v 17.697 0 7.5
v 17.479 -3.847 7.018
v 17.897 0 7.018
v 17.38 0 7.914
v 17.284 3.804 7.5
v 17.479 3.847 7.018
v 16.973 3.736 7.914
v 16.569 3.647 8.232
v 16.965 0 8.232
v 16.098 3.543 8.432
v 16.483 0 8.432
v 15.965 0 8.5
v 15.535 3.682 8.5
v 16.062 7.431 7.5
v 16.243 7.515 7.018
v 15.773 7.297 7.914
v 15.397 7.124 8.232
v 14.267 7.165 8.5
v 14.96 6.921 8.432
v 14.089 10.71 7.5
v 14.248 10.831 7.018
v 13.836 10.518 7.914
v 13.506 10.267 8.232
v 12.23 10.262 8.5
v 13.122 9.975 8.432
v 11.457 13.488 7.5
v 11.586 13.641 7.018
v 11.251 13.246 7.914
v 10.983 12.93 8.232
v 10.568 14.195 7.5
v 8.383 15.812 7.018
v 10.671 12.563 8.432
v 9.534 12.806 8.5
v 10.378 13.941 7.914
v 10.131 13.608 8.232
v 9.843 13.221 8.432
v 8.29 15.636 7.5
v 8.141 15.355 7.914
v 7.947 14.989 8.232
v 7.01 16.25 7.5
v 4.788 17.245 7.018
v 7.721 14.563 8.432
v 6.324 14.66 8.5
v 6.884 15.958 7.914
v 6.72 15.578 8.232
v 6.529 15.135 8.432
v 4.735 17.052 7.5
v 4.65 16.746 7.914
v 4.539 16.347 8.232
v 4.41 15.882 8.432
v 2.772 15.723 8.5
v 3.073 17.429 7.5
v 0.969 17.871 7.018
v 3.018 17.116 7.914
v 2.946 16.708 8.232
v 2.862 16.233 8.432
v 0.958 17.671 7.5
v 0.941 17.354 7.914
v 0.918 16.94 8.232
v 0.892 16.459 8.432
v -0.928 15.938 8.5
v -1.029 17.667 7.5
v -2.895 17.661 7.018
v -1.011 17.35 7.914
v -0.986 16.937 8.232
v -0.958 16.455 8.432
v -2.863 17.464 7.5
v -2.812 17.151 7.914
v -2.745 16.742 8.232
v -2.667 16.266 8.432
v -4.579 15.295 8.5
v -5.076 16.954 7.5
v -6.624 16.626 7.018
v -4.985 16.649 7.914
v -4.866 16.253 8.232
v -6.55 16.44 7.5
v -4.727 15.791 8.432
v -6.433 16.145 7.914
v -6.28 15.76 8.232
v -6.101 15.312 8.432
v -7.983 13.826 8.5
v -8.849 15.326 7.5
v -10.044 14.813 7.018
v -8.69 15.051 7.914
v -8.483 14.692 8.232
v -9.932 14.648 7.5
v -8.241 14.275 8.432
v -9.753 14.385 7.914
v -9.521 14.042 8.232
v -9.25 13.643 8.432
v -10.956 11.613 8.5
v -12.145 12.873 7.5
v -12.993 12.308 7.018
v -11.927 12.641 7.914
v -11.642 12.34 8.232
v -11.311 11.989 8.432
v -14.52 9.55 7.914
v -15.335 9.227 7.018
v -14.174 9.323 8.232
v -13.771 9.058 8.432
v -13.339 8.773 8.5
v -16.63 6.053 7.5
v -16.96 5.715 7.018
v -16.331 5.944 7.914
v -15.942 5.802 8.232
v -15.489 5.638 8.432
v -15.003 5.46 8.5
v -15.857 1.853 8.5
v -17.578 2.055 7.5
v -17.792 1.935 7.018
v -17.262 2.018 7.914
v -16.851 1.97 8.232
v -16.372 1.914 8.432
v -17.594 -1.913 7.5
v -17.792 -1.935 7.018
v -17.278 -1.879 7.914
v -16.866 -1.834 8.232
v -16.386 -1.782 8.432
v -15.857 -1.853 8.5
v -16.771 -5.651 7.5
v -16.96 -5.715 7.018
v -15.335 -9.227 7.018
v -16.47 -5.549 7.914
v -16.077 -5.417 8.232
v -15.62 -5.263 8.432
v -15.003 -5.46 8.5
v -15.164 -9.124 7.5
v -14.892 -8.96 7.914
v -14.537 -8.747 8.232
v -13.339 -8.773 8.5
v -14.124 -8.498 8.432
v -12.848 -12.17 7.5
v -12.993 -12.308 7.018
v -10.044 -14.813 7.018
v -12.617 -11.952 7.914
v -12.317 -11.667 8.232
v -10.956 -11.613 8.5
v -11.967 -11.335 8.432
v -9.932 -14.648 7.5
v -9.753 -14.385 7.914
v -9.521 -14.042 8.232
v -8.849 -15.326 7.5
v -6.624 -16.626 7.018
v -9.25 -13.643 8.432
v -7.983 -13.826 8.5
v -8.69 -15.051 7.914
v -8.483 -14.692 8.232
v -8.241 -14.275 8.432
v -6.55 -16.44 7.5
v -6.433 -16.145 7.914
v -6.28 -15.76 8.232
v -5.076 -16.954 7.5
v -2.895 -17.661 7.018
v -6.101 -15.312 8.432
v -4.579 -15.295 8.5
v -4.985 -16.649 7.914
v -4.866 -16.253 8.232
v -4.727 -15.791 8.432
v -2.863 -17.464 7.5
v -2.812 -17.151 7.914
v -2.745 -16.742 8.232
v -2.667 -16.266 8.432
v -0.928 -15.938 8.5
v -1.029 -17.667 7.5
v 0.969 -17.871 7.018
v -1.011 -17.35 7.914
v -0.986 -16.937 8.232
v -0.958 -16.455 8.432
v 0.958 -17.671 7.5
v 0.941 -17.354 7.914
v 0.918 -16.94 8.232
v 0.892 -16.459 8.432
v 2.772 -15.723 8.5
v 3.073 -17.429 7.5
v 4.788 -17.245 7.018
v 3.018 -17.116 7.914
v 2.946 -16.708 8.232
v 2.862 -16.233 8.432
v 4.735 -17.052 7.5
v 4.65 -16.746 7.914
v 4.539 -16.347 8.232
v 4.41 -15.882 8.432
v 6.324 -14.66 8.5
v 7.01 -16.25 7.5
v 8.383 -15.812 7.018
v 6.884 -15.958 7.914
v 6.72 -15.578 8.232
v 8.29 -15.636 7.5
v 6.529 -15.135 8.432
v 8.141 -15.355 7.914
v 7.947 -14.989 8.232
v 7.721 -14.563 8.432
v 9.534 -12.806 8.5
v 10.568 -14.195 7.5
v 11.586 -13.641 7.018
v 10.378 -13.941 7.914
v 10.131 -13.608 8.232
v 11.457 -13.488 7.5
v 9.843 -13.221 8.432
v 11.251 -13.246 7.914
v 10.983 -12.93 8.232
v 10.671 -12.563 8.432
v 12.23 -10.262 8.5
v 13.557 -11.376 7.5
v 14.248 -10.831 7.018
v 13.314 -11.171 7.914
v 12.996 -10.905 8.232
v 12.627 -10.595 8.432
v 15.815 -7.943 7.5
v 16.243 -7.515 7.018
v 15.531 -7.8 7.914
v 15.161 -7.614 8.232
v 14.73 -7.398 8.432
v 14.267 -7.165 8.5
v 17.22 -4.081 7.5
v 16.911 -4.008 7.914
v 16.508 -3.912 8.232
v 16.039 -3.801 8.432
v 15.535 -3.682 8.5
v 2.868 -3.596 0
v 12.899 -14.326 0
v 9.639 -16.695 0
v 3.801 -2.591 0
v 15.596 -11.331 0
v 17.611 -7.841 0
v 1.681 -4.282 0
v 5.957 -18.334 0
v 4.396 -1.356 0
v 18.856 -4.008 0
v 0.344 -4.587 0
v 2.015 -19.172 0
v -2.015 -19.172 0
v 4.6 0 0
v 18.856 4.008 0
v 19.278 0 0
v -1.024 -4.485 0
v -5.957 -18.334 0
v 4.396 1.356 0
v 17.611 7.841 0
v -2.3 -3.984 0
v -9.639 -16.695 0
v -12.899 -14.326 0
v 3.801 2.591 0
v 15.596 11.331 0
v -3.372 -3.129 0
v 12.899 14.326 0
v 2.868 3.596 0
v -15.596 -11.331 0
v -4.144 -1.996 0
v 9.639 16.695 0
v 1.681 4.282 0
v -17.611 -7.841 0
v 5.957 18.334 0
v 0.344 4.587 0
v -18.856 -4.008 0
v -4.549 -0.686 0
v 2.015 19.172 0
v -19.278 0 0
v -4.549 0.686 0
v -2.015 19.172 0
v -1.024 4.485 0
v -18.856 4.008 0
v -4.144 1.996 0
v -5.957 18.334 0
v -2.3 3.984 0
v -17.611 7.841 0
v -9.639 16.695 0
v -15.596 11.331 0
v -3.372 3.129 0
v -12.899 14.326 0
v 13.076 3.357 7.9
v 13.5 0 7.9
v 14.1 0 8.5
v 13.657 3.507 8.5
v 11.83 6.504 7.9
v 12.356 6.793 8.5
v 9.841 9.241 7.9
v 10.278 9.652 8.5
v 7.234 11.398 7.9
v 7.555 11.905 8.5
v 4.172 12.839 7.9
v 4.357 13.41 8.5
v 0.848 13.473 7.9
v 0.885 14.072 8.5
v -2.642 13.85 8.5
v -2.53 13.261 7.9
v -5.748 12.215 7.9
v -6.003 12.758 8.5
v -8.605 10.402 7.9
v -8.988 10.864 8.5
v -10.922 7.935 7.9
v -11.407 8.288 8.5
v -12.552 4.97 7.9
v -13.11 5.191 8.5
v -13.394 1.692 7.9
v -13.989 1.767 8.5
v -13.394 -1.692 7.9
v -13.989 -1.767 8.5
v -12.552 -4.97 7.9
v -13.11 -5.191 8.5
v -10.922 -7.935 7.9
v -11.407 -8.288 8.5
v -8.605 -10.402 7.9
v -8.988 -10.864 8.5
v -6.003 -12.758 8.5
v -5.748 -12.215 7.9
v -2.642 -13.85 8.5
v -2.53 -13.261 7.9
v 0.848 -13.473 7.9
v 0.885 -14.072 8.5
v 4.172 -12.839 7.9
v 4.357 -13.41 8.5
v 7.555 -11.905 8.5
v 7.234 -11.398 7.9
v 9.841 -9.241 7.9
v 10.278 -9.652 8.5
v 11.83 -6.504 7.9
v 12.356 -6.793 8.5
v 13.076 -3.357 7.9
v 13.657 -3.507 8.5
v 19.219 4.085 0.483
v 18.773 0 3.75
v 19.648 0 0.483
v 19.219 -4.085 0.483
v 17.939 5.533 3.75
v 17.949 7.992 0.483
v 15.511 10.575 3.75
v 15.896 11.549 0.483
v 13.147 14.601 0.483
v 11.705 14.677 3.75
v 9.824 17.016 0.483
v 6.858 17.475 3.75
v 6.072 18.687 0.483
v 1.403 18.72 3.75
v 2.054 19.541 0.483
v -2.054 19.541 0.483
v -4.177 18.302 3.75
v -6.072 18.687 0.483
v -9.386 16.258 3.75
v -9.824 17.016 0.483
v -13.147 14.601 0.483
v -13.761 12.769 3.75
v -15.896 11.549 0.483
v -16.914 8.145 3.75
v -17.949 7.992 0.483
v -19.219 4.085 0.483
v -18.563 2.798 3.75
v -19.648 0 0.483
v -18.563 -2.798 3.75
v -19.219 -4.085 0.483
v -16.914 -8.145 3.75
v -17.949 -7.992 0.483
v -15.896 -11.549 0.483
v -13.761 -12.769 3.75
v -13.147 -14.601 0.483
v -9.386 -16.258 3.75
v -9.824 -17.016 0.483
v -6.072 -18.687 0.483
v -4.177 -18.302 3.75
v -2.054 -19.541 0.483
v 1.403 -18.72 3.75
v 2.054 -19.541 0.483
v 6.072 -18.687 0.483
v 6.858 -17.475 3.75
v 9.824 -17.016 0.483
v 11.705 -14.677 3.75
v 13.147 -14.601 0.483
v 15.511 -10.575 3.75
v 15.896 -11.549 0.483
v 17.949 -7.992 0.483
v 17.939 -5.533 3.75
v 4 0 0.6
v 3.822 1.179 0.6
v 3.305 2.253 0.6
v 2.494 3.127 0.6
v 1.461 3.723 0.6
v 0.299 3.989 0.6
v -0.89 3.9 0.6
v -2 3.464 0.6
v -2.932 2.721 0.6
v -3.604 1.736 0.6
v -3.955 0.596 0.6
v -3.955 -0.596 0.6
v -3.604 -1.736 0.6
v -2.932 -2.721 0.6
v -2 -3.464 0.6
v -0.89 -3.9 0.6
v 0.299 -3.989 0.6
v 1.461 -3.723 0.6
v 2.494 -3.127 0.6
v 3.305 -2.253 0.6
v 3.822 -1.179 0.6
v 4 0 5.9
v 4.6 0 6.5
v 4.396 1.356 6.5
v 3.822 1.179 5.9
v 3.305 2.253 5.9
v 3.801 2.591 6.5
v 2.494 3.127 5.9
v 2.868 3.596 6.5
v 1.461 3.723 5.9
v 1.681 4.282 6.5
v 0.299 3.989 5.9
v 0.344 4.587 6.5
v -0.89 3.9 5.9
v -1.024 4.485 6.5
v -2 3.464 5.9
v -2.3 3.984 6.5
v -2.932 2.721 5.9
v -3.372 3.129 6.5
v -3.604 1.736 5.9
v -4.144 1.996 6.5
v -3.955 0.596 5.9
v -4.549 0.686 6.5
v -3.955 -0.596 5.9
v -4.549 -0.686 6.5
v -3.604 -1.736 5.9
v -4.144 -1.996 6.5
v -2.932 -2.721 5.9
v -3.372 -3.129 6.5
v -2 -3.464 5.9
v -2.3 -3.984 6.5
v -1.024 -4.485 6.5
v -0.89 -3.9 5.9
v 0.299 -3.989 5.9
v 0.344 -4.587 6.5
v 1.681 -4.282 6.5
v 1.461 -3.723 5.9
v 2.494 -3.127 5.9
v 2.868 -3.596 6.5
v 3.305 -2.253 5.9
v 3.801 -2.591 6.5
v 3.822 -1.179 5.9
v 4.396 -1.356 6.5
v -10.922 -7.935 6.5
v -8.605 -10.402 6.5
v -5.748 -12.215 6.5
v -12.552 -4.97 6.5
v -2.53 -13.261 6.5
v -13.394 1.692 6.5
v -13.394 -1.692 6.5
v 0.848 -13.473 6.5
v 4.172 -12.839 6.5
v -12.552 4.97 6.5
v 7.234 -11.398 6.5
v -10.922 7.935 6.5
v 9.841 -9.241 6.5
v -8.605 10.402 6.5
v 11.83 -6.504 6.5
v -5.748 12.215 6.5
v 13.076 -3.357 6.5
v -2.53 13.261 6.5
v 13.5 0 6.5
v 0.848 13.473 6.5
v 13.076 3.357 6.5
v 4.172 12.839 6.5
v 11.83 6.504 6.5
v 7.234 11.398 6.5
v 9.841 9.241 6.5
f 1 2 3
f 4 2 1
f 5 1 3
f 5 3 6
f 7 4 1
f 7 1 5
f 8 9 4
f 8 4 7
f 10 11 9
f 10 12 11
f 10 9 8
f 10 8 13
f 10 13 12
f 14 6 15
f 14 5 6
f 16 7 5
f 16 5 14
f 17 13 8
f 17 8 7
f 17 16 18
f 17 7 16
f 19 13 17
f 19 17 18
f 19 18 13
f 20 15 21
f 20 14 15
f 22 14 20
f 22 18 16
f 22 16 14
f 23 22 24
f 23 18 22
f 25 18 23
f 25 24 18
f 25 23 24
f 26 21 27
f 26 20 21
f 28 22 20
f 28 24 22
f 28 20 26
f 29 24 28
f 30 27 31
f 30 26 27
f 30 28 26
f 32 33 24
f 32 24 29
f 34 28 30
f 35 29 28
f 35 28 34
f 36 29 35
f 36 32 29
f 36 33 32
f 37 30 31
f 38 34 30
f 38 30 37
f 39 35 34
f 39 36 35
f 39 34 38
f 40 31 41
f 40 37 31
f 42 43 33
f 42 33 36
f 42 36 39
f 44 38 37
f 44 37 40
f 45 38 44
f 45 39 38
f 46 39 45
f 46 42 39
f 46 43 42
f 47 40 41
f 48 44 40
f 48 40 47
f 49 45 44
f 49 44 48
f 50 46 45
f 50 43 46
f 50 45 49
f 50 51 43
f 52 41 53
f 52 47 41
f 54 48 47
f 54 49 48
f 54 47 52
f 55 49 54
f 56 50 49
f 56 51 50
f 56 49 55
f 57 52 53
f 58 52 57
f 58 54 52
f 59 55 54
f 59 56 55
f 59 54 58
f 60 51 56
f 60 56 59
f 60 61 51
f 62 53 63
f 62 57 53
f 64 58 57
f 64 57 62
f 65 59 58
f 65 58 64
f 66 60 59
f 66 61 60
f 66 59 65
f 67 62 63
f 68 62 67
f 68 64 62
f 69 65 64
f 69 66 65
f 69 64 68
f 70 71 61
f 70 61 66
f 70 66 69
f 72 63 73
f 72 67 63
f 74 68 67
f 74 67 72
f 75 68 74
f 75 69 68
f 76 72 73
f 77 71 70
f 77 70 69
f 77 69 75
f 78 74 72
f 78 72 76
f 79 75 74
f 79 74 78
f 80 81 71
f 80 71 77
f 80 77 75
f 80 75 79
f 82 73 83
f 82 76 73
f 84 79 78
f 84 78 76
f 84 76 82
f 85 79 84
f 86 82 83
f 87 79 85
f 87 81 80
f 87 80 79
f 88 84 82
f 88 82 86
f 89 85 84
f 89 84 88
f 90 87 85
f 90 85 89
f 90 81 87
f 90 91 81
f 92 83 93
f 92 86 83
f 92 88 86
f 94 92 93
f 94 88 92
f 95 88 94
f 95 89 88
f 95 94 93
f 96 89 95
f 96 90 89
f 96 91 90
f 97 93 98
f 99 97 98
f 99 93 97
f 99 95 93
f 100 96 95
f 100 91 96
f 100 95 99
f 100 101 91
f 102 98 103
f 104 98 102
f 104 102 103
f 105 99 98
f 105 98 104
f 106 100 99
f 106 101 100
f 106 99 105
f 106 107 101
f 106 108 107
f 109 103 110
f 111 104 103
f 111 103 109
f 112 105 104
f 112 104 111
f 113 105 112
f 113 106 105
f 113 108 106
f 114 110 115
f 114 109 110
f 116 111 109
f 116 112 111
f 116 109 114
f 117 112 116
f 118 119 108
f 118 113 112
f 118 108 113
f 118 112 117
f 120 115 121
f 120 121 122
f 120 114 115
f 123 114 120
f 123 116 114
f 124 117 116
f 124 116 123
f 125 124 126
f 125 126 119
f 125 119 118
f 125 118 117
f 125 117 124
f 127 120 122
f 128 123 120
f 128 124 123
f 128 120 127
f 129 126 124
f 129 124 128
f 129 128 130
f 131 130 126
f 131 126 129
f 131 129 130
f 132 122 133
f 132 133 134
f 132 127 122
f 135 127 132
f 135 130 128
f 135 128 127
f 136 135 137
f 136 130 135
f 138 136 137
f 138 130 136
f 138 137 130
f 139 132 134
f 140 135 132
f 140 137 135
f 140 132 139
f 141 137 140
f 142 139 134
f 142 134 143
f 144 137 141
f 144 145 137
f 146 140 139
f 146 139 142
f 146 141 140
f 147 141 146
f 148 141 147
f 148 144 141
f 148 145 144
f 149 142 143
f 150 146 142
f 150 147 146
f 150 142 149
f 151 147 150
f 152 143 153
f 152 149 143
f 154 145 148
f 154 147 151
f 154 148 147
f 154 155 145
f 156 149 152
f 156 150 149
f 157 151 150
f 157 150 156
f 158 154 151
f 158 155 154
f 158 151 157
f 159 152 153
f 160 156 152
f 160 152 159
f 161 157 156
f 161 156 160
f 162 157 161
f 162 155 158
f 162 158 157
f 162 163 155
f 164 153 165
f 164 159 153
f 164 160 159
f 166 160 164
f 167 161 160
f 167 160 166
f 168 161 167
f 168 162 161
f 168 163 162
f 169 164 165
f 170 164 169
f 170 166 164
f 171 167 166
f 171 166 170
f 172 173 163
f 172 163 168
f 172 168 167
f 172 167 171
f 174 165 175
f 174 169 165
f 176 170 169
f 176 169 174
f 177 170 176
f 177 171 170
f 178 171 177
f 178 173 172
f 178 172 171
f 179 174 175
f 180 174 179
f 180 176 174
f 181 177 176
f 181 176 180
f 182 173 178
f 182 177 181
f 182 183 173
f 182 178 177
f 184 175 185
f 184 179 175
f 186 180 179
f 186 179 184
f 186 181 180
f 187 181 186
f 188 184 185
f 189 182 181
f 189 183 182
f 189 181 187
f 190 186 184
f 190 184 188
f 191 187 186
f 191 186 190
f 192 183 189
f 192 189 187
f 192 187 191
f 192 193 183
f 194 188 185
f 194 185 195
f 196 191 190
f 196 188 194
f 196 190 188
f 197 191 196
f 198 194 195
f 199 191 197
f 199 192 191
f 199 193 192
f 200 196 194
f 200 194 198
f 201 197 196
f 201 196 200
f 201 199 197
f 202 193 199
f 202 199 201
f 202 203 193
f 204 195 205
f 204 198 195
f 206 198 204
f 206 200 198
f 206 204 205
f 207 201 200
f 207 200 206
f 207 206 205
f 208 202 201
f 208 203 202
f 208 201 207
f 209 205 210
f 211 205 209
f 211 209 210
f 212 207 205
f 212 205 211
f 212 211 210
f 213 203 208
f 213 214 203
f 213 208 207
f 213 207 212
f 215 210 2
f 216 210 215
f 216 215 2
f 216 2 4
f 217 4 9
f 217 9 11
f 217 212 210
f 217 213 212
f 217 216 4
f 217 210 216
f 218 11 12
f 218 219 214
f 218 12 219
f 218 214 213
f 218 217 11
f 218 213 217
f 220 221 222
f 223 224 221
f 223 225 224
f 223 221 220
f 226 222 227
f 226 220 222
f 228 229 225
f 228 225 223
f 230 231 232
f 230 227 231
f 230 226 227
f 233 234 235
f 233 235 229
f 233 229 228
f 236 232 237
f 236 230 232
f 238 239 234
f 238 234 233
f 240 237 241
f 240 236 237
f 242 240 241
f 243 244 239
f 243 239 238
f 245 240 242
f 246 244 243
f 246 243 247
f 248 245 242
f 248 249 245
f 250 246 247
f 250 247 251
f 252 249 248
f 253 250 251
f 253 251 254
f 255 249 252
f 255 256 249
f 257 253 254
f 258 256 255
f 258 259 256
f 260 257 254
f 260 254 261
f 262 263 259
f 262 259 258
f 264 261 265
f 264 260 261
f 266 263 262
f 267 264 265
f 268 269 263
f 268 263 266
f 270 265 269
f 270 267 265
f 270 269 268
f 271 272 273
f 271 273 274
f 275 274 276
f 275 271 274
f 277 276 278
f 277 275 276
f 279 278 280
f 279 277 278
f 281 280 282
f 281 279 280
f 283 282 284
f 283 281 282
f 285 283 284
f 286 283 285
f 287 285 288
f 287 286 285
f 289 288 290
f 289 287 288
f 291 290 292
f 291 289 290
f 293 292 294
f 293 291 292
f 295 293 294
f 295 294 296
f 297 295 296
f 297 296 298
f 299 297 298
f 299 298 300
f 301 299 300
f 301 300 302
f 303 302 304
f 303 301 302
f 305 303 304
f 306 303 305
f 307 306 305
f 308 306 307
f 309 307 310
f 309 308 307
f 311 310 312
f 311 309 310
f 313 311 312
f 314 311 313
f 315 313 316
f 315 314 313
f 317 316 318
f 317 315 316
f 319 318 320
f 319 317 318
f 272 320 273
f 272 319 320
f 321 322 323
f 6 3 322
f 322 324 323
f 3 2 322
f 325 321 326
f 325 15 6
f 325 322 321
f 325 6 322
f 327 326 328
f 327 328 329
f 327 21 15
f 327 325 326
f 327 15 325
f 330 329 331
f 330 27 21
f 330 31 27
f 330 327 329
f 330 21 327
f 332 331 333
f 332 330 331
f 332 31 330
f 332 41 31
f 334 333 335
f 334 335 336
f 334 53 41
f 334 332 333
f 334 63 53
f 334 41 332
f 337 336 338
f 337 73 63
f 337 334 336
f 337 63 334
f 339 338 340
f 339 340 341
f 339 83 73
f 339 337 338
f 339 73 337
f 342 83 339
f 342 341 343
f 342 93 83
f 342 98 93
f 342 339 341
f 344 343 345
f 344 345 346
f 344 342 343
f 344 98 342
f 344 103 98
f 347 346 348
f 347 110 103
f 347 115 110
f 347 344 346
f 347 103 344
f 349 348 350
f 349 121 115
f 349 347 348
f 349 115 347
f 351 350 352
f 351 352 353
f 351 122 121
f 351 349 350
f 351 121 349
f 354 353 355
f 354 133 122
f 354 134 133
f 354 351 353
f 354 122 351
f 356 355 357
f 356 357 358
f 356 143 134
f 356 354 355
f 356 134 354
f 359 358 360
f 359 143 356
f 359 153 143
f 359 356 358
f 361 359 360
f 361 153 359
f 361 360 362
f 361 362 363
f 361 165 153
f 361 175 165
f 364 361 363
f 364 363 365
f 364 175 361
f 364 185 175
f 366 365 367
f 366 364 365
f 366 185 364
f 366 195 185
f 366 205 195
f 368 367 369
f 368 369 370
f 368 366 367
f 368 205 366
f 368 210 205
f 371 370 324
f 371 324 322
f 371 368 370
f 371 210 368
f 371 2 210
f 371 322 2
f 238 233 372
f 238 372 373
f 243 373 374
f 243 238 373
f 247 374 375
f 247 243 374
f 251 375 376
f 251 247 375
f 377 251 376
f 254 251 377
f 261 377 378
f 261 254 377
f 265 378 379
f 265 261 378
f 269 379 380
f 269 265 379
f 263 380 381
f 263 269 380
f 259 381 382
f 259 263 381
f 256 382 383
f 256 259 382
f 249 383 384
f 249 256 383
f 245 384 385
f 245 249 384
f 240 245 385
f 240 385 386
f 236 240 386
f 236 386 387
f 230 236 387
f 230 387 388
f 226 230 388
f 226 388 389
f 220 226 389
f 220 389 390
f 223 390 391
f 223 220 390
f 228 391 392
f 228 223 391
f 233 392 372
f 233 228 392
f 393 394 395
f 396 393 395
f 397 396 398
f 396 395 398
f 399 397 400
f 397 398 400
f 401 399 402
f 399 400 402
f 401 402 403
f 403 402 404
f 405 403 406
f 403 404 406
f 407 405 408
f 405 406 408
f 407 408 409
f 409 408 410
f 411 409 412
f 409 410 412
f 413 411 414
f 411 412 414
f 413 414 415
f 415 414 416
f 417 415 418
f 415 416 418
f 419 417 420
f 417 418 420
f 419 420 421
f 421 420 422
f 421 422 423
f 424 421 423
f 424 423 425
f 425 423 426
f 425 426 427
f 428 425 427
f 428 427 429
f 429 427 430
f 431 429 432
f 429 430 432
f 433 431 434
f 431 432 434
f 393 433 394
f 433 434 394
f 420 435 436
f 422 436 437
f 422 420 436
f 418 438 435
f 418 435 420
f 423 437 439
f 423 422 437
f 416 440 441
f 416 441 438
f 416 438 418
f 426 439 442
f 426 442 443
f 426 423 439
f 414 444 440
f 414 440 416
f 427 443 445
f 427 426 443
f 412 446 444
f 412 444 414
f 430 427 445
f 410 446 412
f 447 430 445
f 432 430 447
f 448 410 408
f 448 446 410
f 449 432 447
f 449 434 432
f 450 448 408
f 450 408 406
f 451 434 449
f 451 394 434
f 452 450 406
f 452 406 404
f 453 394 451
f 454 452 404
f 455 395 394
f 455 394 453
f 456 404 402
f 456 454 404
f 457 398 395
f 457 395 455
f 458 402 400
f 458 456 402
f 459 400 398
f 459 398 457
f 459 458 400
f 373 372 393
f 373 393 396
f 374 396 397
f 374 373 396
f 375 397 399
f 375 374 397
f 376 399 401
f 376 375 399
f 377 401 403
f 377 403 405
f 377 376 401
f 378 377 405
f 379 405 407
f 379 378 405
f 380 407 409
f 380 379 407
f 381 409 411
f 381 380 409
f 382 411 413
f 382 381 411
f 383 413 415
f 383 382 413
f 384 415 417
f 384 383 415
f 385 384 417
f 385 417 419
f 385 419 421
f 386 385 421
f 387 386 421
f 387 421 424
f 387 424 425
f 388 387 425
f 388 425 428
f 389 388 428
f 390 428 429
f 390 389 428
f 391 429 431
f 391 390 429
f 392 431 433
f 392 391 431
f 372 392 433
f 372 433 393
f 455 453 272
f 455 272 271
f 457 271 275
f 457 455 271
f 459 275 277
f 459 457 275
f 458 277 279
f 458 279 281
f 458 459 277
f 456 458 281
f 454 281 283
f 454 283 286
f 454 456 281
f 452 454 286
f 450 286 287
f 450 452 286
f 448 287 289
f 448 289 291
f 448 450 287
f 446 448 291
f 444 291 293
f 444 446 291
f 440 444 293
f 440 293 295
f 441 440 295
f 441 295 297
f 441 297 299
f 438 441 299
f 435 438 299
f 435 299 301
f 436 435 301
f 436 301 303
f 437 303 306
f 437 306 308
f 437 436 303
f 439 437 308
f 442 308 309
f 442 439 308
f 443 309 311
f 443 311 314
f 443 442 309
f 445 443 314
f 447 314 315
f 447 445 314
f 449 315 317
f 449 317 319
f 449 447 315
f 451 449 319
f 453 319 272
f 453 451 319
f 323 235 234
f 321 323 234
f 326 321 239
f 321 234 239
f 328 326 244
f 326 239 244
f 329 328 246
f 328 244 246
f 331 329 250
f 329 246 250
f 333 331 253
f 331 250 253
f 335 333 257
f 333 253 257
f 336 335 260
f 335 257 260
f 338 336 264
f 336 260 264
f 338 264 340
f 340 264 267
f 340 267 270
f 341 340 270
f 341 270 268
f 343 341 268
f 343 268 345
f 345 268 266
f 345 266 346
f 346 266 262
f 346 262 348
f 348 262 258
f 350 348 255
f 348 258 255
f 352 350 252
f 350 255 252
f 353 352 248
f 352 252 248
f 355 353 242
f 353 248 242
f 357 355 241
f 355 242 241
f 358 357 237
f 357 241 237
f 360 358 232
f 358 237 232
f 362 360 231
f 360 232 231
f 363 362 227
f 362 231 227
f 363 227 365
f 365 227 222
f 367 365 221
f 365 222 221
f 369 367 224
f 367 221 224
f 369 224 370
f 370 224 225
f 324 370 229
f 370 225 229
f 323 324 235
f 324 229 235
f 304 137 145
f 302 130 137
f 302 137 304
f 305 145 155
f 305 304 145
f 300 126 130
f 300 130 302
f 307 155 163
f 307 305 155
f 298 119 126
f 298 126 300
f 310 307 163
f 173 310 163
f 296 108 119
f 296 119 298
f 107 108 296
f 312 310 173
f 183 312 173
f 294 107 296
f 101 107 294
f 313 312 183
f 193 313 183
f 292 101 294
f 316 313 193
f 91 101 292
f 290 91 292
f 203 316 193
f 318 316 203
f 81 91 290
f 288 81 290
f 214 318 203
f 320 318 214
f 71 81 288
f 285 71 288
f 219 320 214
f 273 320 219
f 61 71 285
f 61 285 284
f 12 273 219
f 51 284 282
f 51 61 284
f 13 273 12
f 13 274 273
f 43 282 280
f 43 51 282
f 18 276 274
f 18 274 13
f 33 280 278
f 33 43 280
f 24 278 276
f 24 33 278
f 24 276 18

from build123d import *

# Parameters (mm, degrees)
F2_SIZE = 0.6
F3_R    = 2
F4_SIZE = 0.5


with BuildPart() as f1:
    # F0 (on Front) → F1 (revolve)
    with BuildSketch(Plane.XZ):
        Polygon((4, 6.5), (4, 0), (19.777568, 0), (17.5, 8.5), (13.5, 8.5), (13.5, 6.5), align=None)
    revolve(axis=Axis((0, 0, 2.242119), (0, 0, 1)))

    # F2
    f2_edges = [f1.edges().sort_by_distance(p)[0] for p in [
        (-13.5, 0, 8.5),
        (-4, 0, 6.5),
        (-4, 0, 0),
    ]]
    chamfer(f2_edges, length=F2_SIZE)

    # F3
    f3_edges = [f1.edges().sort_by_distance(p)[0] for p in [
        (-17.5, 0, 8.5),
    ]]
    fillet(f3_edges, radius=F3_R)

    # F4
    f4_edges = [f1.edges().sort_by_distance(p)[0] for p in [
        (-19.777568, 0, 0),
    ]]
    chamfer(f4_edges, length=F4_SIZE)


solid = f1.part
